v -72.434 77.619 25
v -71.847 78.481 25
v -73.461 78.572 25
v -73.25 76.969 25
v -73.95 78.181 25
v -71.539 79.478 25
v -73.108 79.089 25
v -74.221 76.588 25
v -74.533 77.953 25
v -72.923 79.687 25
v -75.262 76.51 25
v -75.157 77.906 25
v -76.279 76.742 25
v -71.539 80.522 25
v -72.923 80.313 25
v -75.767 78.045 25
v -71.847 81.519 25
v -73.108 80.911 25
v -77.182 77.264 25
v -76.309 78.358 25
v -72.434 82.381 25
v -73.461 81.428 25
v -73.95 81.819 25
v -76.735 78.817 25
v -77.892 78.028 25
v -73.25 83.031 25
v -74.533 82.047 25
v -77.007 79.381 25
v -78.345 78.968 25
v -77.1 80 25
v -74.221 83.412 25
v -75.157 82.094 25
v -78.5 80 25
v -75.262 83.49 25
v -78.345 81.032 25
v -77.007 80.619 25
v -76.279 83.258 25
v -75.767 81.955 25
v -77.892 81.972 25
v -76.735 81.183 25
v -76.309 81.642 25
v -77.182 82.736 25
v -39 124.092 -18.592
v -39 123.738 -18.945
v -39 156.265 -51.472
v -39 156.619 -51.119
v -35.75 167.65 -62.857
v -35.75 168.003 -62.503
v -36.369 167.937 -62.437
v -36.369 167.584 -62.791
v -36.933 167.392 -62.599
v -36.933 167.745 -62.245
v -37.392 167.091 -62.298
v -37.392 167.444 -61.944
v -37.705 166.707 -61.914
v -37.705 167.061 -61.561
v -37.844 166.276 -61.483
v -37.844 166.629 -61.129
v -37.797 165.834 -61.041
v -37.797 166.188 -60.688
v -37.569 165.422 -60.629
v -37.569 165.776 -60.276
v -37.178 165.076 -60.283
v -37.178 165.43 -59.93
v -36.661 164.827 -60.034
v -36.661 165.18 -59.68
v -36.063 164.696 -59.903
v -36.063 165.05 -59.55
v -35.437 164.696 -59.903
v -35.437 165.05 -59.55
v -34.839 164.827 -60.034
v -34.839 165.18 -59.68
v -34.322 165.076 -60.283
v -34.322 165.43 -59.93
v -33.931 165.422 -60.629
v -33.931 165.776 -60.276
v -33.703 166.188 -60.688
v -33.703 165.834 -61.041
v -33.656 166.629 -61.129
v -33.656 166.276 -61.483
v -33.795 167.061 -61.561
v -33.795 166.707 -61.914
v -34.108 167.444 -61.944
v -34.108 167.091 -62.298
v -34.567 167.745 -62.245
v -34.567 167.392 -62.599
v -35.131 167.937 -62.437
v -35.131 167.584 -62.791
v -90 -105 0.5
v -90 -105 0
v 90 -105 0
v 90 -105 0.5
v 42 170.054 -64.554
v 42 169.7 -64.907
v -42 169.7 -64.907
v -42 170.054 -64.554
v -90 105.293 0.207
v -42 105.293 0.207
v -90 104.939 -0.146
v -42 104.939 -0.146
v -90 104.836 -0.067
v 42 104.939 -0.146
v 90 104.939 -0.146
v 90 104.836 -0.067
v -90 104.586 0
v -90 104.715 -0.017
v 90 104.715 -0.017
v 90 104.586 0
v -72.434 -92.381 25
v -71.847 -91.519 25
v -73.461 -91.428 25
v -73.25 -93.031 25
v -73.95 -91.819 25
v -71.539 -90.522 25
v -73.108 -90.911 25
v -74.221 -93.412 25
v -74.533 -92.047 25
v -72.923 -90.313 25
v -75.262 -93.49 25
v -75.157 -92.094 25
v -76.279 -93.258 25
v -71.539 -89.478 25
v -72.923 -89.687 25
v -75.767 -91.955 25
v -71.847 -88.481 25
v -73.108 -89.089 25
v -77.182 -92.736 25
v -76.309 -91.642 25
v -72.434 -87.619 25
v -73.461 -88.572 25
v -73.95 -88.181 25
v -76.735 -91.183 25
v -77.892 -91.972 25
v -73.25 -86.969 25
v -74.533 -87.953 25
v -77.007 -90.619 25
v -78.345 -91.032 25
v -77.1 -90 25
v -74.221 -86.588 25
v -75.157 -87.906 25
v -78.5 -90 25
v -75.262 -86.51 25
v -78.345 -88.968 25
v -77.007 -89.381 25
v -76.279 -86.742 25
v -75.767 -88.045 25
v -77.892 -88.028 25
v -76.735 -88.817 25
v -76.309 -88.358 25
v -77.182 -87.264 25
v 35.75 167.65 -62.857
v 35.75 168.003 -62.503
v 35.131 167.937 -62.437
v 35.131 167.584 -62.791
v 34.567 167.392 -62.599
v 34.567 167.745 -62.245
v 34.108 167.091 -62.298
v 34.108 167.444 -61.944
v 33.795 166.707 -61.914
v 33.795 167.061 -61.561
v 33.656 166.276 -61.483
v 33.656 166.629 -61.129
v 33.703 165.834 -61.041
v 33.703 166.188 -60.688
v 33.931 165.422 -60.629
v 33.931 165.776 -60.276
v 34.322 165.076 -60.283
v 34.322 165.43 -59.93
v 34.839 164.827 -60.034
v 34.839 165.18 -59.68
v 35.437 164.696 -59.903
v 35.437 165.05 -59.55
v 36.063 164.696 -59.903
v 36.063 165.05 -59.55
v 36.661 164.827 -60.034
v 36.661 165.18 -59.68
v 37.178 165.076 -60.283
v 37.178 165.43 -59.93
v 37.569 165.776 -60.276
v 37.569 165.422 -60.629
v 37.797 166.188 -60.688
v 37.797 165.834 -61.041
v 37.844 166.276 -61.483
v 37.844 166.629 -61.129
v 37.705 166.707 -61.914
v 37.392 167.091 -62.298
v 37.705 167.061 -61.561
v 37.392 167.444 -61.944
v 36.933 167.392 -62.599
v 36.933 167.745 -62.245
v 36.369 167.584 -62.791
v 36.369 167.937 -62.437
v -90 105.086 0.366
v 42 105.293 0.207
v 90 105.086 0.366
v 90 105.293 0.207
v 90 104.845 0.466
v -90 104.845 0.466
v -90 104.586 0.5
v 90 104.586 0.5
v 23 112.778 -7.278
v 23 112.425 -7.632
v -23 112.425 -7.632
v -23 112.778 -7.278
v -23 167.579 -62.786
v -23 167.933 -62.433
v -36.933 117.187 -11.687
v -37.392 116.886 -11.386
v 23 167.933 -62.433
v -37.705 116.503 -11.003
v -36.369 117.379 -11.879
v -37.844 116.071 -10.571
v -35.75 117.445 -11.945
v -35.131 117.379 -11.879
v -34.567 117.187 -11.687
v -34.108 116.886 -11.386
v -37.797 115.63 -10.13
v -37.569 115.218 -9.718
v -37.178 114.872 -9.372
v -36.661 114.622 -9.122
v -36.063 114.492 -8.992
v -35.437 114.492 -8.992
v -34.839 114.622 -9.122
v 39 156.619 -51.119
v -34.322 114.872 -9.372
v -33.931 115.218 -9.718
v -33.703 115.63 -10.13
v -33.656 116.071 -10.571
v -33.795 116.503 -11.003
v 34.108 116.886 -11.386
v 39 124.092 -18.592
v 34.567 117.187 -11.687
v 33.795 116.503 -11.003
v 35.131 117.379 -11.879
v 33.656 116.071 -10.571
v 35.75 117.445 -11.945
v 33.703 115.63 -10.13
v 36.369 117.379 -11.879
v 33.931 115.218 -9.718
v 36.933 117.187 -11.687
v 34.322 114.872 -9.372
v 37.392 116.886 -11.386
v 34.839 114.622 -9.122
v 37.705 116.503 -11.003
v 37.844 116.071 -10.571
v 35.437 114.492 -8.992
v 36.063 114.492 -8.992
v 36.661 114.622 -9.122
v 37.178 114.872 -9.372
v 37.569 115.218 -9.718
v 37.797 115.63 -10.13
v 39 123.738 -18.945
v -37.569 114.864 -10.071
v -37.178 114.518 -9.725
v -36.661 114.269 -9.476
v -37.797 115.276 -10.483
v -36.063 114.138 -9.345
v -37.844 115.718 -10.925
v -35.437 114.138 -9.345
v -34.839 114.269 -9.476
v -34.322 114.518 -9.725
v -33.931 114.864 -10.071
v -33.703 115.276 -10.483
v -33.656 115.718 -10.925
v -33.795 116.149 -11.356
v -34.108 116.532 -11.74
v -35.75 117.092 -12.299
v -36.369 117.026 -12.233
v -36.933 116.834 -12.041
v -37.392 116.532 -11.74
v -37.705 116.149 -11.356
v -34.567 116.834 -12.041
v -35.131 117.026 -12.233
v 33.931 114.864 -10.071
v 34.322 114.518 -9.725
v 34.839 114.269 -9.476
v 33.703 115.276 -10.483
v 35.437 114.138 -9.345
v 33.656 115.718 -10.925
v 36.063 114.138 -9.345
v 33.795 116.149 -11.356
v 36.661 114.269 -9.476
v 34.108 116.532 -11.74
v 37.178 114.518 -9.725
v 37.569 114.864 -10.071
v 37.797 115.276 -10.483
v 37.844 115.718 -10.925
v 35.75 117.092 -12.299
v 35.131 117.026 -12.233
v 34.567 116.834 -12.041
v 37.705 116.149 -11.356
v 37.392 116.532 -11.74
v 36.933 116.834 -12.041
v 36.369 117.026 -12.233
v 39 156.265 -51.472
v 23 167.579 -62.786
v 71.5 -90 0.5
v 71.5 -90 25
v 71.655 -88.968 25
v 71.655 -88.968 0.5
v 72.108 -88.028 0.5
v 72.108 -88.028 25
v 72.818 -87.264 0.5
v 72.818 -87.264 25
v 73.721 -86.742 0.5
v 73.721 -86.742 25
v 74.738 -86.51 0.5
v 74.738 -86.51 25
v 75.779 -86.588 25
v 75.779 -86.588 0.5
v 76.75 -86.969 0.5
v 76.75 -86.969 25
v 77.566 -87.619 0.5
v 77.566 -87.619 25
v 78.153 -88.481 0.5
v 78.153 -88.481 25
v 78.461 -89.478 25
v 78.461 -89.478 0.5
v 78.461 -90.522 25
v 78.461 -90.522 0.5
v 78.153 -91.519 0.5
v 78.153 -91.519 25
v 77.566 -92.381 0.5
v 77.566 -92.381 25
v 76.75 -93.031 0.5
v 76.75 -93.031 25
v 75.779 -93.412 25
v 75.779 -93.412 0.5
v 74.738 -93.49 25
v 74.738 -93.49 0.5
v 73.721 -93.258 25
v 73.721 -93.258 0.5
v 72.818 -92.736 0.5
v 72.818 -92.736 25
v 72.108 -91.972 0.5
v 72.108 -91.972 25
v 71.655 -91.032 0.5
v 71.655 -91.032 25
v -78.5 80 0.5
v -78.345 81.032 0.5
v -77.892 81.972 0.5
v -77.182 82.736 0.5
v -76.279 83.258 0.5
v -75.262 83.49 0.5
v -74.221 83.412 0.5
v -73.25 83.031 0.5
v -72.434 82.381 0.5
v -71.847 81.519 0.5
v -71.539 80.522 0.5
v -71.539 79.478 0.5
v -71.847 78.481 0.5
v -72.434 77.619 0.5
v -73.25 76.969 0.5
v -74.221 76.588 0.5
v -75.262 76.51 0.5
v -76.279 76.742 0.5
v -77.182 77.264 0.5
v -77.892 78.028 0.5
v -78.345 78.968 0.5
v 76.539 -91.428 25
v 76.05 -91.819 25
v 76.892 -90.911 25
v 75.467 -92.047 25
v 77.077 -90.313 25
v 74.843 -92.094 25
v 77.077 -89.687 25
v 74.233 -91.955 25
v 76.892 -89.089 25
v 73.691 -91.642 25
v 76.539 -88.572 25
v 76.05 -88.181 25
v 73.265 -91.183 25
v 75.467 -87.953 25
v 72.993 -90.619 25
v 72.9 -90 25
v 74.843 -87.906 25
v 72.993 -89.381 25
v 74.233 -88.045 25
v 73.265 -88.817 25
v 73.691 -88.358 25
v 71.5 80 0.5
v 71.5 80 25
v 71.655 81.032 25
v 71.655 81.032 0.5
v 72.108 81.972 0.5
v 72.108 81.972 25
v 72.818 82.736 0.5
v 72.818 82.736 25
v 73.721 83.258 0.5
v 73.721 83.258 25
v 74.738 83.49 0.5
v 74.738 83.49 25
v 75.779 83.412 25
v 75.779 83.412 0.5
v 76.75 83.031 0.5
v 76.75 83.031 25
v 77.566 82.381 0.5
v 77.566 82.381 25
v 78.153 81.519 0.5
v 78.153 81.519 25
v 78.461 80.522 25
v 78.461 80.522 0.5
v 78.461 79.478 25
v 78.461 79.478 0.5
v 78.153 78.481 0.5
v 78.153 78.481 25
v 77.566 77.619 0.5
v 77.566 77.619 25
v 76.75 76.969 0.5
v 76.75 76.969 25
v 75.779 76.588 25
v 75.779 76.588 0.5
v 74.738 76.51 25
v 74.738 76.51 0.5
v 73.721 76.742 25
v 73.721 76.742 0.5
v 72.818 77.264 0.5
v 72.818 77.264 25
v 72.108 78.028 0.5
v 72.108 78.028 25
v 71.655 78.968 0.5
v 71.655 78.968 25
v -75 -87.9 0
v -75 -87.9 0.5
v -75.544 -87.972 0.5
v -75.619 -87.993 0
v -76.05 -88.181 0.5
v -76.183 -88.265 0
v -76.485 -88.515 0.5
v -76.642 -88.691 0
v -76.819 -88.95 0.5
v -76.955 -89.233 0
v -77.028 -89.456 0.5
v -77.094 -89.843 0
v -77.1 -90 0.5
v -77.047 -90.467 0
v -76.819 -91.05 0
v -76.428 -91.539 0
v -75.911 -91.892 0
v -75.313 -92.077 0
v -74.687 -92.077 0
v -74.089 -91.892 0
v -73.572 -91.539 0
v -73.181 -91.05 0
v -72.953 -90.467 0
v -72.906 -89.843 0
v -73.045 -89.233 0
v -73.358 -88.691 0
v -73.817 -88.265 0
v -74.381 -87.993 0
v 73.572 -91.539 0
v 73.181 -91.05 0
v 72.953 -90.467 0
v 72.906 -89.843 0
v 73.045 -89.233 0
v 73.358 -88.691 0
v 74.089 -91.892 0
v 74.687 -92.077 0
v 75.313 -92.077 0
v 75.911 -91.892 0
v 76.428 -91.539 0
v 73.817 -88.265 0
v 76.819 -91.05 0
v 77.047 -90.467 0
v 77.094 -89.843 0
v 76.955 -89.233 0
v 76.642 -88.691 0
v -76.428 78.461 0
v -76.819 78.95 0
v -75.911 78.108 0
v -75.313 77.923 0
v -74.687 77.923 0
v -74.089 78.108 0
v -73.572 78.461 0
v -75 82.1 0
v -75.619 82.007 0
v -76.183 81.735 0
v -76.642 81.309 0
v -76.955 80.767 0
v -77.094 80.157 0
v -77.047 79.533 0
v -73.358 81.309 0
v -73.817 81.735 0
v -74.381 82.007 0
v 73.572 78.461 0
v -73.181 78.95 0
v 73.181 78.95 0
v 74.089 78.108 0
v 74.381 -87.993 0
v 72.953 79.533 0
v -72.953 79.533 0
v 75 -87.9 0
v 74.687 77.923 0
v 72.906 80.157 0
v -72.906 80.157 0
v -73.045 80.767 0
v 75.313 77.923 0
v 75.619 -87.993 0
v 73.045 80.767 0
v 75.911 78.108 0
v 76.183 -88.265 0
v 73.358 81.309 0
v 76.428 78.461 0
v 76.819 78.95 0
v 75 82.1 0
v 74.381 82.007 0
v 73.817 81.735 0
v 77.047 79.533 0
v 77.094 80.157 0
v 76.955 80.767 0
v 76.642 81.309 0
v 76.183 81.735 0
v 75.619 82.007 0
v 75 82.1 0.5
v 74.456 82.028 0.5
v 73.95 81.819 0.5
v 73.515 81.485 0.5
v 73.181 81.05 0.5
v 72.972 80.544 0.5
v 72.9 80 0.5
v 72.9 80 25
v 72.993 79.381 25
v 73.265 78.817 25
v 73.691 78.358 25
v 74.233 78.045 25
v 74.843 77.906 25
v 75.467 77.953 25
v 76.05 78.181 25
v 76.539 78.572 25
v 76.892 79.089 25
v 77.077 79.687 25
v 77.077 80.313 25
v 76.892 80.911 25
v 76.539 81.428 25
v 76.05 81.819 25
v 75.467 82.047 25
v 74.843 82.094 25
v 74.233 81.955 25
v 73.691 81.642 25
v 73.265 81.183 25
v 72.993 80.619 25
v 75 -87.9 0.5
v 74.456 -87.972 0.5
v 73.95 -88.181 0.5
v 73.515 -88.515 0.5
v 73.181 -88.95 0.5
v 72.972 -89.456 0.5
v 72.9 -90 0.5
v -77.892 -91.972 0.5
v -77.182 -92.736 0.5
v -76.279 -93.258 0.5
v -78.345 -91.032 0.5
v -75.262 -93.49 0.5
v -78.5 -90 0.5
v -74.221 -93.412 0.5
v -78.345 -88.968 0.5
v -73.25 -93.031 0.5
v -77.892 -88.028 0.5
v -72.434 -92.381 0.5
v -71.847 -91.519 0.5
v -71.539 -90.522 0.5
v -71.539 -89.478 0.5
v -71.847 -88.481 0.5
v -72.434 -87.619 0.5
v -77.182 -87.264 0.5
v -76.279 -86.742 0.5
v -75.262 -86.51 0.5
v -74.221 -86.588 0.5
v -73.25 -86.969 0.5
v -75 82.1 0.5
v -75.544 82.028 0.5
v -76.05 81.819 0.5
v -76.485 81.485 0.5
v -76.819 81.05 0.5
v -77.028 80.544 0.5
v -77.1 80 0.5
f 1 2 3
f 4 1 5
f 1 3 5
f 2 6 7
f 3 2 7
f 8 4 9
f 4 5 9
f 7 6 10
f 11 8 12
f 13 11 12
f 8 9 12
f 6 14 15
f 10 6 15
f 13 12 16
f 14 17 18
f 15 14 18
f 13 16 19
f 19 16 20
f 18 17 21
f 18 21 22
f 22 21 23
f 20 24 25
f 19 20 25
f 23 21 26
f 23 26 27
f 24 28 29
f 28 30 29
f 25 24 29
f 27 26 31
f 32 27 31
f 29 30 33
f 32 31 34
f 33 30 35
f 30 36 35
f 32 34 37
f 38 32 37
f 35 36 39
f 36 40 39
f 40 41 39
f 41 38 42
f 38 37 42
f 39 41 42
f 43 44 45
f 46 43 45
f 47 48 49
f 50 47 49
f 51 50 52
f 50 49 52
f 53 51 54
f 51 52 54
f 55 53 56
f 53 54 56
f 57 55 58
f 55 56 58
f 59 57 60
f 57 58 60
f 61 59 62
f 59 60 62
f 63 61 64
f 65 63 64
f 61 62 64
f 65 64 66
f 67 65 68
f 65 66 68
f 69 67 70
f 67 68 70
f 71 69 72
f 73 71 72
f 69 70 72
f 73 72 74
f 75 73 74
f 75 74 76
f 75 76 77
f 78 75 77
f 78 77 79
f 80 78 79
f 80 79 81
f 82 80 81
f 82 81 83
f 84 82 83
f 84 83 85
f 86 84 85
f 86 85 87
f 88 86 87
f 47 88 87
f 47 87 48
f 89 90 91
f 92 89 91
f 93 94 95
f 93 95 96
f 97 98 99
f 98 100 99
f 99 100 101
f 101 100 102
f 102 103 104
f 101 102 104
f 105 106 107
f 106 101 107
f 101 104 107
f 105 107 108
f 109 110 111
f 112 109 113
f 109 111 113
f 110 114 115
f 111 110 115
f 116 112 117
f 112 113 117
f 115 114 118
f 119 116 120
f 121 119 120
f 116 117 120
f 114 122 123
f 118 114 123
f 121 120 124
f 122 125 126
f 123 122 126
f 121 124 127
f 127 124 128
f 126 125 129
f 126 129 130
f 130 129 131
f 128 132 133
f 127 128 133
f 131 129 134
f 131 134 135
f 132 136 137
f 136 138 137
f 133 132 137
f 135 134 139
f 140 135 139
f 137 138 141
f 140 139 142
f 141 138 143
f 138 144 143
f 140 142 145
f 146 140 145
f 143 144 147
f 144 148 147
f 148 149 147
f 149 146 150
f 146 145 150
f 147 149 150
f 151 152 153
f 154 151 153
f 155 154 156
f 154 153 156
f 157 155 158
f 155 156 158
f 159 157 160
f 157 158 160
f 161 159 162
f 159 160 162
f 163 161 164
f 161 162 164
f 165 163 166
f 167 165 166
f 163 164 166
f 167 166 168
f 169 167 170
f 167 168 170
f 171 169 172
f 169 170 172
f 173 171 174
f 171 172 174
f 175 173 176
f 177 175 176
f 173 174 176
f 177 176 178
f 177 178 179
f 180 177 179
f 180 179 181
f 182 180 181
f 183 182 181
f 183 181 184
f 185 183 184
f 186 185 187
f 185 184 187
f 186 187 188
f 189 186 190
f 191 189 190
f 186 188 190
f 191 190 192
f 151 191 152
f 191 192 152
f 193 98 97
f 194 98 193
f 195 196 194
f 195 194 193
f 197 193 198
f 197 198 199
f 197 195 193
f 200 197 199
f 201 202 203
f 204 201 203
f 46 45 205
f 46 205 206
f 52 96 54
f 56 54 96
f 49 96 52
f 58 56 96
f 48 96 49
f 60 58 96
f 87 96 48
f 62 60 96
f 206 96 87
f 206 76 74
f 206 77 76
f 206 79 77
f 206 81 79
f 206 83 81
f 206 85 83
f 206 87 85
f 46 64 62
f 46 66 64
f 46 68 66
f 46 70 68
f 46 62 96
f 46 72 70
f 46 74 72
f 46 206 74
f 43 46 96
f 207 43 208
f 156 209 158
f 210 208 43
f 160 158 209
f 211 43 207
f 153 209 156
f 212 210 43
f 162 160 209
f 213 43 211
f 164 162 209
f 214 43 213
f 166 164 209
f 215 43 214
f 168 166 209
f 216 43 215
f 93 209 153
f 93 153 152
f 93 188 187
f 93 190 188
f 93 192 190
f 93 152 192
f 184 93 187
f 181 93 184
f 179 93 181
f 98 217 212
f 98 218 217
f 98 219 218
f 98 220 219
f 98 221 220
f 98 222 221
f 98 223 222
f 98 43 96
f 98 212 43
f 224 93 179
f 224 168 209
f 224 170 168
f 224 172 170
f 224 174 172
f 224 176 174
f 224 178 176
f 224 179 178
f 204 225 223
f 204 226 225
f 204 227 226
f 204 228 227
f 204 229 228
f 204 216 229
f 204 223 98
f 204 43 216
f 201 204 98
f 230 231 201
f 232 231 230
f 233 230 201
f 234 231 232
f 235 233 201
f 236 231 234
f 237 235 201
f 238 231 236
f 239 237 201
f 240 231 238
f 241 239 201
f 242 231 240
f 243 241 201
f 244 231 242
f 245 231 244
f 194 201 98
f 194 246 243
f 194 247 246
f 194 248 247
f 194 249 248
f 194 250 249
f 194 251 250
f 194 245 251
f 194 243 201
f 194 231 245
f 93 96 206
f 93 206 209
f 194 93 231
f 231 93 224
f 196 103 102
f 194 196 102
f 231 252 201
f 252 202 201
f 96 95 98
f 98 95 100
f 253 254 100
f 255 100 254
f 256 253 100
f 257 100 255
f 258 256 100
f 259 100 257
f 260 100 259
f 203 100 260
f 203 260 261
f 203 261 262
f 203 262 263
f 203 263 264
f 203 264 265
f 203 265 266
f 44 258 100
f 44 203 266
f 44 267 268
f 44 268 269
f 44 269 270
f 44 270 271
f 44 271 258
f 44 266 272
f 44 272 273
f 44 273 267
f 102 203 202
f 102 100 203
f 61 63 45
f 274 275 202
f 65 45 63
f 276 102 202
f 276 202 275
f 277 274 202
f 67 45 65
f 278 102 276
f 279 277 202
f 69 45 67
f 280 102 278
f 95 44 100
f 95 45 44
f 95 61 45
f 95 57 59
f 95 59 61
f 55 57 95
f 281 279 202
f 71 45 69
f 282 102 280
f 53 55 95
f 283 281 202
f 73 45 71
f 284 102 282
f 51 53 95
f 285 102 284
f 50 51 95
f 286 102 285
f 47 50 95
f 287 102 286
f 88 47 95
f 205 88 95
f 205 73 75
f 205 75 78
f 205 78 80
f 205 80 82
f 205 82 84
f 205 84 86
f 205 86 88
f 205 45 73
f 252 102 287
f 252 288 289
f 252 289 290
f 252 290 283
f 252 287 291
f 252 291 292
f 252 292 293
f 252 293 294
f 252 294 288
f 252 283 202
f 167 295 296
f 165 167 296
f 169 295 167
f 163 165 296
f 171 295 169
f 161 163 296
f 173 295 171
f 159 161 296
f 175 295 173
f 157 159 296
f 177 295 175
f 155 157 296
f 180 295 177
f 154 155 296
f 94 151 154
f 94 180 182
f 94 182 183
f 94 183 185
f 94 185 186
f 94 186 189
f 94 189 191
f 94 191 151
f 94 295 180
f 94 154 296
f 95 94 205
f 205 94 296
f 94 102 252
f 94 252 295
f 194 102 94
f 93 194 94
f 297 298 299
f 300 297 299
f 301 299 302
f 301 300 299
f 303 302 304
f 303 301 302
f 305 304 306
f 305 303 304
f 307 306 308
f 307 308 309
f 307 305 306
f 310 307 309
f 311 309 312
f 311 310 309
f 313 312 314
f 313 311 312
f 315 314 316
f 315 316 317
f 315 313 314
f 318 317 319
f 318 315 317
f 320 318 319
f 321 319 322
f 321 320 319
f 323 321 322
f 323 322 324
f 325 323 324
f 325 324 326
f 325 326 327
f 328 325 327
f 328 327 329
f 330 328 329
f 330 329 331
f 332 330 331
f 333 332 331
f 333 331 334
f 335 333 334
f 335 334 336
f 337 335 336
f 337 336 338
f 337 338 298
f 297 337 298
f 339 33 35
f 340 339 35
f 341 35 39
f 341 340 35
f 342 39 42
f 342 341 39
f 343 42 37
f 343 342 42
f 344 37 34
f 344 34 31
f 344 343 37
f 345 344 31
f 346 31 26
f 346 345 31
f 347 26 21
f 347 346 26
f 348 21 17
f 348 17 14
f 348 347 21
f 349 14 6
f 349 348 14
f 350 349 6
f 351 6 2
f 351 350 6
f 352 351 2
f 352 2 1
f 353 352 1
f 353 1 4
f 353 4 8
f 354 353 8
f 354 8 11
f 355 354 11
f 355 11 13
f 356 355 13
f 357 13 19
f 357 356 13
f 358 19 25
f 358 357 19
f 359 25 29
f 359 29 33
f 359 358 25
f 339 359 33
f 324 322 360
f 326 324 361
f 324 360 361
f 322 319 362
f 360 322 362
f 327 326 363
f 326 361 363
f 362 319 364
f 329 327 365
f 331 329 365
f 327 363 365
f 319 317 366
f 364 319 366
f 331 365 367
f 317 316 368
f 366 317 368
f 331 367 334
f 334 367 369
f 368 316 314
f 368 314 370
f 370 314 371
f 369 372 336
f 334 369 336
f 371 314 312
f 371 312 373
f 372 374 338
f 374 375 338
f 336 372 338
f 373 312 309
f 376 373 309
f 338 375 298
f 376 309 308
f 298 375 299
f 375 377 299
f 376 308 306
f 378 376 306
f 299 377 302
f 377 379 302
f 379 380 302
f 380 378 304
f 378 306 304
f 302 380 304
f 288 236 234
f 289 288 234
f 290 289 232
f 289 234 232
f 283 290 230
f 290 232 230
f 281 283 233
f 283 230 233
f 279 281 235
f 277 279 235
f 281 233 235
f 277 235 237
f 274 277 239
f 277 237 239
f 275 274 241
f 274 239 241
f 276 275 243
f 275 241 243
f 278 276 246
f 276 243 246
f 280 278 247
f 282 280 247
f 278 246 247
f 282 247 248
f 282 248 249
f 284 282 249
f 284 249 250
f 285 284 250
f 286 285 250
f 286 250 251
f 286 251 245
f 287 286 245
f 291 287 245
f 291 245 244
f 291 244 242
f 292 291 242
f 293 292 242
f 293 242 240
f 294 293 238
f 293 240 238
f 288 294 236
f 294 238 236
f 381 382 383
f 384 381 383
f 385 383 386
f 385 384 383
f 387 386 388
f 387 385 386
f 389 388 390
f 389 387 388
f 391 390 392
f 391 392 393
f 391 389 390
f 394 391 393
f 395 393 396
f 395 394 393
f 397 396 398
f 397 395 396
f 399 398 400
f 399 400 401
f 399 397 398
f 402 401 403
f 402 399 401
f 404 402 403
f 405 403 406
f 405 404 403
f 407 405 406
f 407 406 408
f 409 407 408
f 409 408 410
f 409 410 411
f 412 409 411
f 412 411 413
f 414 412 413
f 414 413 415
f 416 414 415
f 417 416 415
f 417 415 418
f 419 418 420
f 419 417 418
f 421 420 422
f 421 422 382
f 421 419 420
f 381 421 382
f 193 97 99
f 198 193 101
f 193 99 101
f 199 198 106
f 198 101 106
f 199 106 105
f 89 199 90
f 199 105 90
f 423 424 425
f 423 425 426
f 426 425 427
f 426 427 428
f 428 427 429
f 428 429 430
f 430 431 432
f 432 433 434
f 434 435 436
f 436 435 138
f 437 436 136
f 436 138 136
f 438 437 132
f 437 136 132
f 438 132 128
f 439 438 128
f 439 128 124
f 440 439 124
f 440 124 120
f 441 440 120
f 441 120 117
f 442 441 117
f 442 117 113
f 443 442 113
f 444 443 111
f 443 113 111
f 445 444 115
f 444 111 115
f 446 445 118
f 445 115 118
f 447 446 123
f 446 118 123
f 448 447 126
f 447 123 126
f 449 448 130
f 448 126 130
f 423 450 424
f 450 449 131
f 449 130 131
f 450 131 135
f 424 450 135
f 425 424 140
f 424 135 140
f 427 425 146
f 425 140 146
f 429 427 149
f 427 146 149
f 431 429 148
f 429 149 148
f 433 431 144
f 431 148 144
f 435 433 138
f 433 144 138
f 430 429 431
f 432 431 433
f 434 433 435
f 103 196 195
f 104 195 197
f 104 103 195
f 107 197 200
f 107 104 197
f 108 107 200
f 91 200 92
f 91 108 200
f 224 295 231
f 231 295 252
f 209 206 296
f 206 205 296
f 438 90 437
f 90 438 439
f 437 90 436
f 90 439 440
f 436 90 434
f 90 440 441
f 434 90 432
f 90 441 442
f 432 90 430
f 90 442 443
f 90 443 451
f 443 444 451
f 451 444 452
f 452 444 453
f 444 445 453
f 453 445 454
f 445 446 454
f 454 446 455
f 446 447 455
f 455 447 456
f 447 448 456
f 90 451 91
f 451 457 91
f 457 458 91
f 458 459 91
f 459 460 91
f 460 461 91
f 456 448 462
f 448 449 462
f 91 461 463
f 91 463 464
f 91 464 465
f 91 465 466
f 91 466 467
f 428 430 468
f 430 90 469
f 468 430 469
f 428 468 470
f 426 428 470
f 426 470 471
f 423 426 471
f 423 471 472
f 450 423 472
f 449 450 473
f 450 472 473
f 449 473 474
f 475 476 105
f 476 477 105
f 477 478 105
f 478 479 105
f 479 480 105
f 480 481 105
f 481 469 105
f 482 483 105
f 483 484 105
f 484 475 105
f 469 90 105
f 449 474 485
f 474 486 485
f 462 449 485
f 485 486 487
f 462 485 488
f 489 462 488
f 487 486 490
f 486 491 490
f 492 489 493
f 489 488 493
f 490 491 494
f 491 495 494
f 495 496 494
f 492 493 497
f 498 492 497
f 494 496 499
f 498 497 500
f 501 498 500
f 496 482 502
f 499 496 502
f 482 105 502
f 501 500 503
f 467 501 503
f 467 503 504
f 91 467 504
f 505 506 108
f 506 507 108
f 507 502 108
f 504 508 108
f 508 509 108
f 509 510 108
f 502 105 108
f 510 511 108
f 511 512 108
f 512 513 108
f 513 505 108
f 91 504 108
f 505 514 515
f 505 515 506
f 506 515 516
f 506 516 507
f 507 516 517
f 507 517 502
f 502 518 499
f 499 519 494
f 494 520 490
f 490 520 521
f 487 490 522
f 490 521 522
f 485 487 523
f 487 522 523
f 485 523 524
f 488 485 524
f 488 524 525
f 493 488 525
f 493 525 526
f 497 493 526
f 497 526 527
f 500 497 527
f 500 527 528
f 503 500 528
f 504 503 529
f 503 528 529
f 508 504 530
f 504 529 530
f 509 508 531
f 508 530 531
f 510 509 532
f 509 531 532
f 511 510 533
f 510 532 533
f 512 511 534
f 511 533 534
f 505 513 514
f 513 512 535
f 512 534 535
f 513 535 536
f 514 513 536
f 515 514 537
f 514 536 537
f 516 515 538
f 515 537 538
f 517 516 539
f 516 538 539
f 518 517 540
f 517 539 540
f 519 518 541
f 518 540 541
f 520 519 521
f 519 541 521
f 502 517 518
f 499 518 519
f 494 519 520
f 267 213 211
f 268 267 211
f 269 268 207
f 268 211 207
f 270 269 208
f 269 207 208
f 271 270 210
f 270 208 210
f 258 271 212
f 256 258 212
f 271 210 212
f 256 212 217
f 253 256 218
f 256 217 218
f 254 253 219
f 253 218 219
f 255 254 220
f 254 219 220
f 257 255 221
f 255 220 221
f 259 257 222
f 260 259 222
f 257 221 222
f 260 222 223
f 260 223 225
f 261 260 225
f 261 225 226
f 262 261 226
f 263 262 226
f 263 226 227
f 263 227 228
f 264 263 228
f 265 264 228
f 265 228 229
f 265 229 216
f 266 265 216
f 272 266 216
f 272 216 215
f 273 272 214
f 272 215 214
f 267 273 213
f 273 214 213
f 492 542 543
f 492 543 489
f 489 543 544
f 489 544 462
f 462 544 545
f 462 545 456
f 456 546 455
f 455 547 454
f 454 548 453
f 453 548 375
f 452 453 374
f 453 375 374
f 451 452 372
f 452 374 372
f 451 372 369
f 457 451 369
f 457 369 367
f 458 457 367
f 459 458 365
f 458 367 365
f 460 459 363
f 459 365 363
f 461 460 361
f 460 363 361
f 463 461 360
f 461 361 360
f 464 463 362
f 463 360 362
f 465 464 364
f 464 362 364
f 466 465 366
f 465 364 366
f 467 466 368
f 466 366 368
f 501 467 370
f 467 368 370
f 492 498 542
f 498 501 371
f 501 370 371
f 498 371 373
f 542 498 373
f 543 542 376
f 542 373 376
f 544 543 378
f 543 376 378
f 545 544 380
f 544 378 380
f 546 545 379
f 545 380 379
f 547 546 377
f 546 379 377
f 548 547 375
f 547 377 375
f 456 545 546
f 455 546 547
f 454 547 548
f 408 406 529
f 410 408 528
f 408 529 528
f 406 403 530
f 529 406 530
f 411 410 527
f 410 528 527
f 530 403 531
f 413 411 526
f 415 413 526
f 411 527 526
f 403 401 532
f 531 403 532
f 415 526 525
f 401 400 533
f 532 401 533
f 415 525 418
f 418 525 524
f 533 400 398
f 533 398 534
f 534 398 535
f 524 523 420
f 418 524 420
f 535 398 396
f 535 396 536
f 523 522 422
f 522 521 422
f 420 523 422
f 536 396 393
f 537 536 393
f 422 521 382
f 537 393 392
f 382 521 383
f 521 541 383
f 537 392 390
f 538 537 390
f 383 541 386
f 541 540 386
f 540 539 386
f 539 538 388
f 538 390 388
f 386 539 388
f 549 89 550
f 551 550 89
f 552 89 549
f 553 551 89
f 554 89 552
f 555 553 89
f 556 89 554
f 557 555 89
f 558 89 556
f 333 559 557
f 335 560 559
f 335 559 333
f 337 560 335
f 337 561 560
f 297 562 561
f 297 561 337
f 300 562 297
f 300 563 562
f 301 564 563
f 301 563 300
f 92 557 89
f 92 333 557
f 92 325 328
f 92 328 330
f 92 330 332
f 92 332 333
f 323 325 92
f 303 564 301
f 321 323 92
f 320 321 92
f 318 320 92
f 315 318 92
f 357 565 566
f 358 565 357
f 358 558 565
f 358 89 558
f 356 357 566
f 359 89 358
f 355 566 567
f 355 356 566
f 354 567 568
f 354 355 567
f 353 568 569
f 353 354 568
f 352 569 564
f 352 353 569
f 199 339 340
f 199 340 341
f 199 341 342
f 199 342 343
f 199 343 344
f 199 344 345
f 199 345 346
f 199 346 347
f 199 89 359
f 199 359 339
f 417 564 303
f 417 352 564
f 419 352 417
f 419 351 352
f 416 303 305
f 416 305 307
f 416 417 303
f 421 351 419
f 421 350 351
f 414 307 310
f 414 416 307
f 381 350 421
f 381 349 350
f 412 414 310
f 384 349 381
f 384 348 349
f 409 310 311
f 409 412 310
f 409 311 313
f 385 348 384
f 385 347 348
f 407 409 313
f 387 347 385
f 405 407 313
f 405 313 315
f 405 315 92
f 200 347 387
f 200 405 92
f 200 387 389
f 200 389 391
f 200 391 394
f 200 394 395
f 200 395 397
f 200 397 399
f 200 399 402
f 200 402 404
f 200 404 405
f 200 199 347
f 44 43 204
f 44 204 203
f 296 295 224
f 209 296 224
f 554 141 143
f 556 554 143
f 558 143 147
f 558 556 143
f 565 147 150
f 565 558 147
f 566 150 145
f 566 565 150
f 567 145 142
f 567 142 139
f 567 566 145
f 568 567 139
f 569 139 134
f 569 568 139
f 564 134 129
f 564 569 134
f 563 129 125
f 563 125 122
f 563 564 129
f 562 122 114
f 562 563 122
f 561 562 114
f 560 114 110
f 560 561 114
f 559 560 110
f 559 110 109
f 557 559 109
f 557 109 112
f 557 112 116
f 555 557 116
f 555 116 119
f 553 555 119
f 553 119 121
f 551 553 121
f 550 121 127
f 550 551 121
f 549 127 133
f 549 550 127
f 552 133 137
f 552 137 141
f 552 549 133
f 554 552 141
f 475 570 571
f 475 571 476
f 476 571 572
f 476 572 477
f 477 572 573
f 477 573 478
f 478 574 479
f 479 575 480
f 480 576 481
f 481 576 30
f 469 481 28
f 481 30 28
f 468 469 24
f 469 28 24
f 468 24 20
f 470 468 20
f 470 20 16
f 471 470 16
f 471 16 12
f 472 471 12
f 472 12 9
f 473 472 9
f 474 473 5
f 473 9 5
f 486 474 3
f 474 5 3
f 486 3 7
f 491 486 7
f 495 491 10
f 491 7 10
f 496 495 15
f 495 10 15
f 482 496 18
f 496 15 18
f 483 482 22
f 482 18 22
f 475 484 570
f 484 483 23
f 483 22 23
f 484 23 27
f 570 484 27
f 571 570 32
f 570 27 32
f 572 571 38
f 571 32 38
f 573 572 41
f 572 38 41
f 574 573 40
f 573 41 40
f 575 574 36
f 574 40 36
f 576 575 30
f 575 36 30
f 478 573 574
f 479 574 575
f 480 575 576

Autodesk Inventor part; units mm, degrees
ref_plane "YZ Plane" through (0, 0, 0) normal (1, 0, 0) x (0, 1, 0)
ref_plane "XZ Plane" through (0, 0, 0) normal (0, 1, 0) x (-1, 0, 0)
ref_plane "XY Plane" through (0, 0, 0) normal (0, 0, 1) x (1, 0, 0)
sketch "Sketch1" plane through (0, 0, 0) normal (0, 0, 1) x (1, 0, 0)
  line L0 (-90, -105) -> (90, -105)
  line L1 (90, -105) -> (90, 105)
  line L2 (-90, 105) -> (-90, -105)
  line L3 (42, 105) -> (42, 105)
  line L4 (42, 105) -> (-42, 105)
  line L5 (-42, 105) -> (-42, 105)
  line L6 (90, 105) -> (42, 105)
  line L7 (-42, 105) -> (-90, 105)
  point P0 (0, 0)
  dimension "d0" = 180
  dimension "d1" = 210
  dimension "d2" = 105
  dimension "d3" = 90
  dimension "d22" = 0
  dimension "d24" = 42
  dimension "d26" = 84
  dimension "d28" = 0
  dimension "d29" = 210
  dimension "d30" = 48
  dimension "d31" = 48
extrude "Plate1" add sketch "Sketch1" along normal blind 0.5
sketch "Sketch6" plane through (90, 104.6464, 0.1464) normal (0, 0.7071068, 0.7071068) x (-1, 0, 0)
  line L0 (180, 0) -> (0, 0)
  line L1 (0, 0) -> (0, -92)
  line L2 (0, -92) -> (180, -92)
  line L3 (180, -92) -> (180, 0)
edge flange "Flange1" height 92 angle 45 thickness 0.5 bend radius 0.5 thickness toward (0, 0.7071068, 0.7071068) relief tear relief width 0.5 relief depth 0.25 edges at (66, 105, 0) wall of the first edge with corners at (-90, 104.6464, 0.1464) (90, 104.6464, 0.1464) (90, 169.7003, -64.9074) (-90, 169.7003, -64.9074)
bend "Bend1"
corner "Corner1"
sketch "Sketch7" plane through (90, 169.7003, -64.9074) normal (0, -0.7071068, -0.7071068) x (-1, 0, 0)
  line L0 (180, 0) -> (0, 0) projected
  line L1 (180, -91.9393) -> (0, -91.9393) projected
  line L2 (180, -91.5858) -> (180, 0) projected
  line L3 (0, -91.5858) -> (0, 0) projected
  line L4 (0, -91.5858) -> (180, -91.5858) projected
  line L5 (0, -91.5858) -> (180, -91.5858) projected
  line L6 (180, -91.5858) -> (180, 0) projected
  line L7 (180, 0) -> (0, 0) projected
  line L8 (0, -91.5858) -> (0, 0) projected
  line L9 (0, -91.5858) -> (48, -91.5858)
  line L10 (48, -91.5858) -> (48, 0)
  line L11 (48, 0) -> (0, 0)
  line L12 (0, 0) -> (0, -91.5858)
  point P0 (90, -165.8927)
  dimension "d88" = 180
  dimension "d89" = 48
extrude "Extrusion4" cut sketch "Sketch7" against normal blind 10 contours L10 L4 L3 L0
mirror "Mirror1" about plane through (0, 0, 0) normal (1, 0, 0) of "Extrusion4"
sketch "Sketch8" plane through (42, 169.7003, -64.9074) normal (0, -0.7071068, -0.7071068) x (-1, 0, 0)
  line L0 (81, -3) -> (3, -3)
  line L1 (3, -3) -> (3, -81)
  line L2 (3, -81) -> (81, -81)
  line L3 (81, -81) -> (81, -3)
  line L4 (81, -3) -> (3, -81) construction
  line L5 (3, -3) -> (81, -81) construction
  line L6 (84, 0) -> (0, 0) projected
  point P0 (42, -165.8927)
  point P1 (42, -42)
  dimension "d92" = 78
  dimension "d93" = 0
  dimension "d94" = 3
  dimension "d111" = 78
extrude "Extrusion5" cut sketch "Sketch8" against normal blind 10
chamfer "Chamfer2" distance 16 angle 45 4 edges at (39, 112.6014, -7.455) (39, 167.7557, -62.6093) (-39, 167.7557, -62.6093) (-39, 112.6014, -7.455)
sketch "Sketch9" plane through (42, 169.7003, -64.9074) normal (0, -0.7071068, -0.7071068) x (-1, 0, 0)
  line L0 (77.75, -5) -> (6.25, -5) construction
  line L1 (6.25, -5) -> (6.25, -76.5) construction
  line L2 (6.25, -76.5) -> (77.75, -76.5) construction
  line L3 (77.75, -76.5) -> (77.75, -5) construction
  line L4 (77.75, -5) -> (6.25, -76.5) construction
  line L5 (6.25, -5) -> (77.75, -76.5) construction
  line L6 (84, 0) -> (0, 0) construction
  point P0 (42, -165.8927)
  point P1 (42, -40.75)
  dimension "d100" = 71.5
  dimension "d101" = 71.5
  dimension "d102" = 35.75
  dimension "d103" = 5
hole "Hole3" at (35.75, 166.1647, -61.3718) at (-35.75, 166.1647, -61.3718) at (-35.75, 115.6066, -10.8137) at (35.75, 115.6066, -10.8137) direction (0, 0.7071068, 0.7071068) diameter 4.2 end through all
sketch "Sketch10" plane through (0, 0, 0) normal (0, 0, -1) x (-1, 0, 0)
  line L0 (-75, -90) -> (75, -90) construction
  line L1 (75, -90) -> (75, 80) construction
  line L2 (75, 80) -> (-75, 80) construction
  line L3 (-75, 80) -> (-75, -90) construction
  line L4 (-75, -90) -> (75, 80) construction
  line L5 (75, -90) -> (-75, 80) construction
  line L6 (90, -105) -> (-90, -105) projected
  point P0 (0, -5)
  point P1 (0, 0)
  dimension "d112" = 170
  dimension "d113" = 150
  dimension "d114" = 75
  dimension "d115" = 15
hole "Hole4" at (75, 80, 0) at (75, -90, 0) at (-75, -90, 0) at (-75, 80, 0) direction (0, 0, 1) diameter 4.2 end through all
sketch "Sketch11" plane through (0, 0, 0) normal (0, 0, -1) x (-1, 0, 0)
  circle A0 centre (-75, 80) radius 2.1 projected
  circle A1 centre (-75, 80) radius 3.5
  circle A2 centre (-75, -90) radius 2.1 projected
  circle A3 centre (75, -90) radius 2.1 projected
  circle A4 centre (75, 80) radius 2.1 projected
  circle A5 centre (-75, -90) radius 3.5
  circle A6 centre (75, -90) radius 3.5
  circle A7 centre (75, 80) radius 3.5
  point P0 (0, 0)
  dimension "d123" = 7
  dimension "d124" = 7
  dimension "d125" = 7
  dimension "d126" = 7
extrude "Extrusion7" add sketch "Sketch11" against normal blind 25
equation "\"d111\" = d92"
equation "\"d101\" = d100"
equation "\"d102\" = 0.5 * d101"
equation "\"d109\" = Thickness"
equation "\"d114\" = 0.5 * d113"
equation "\"d121\" = Thickness"
equation "\"d74\" = Thickness"
equation "\"d75\" = BendReliefWidth"
equation "\"d76\" = BendReliefDepth"
equation "\"d77\" = MinimumRemnant"
equation "\"d78\" = TransitionRadius"
equation "\"d81\" = BendRadius"
equation "\"d82\" = CornerReliefSize"
equation "\"d83\" = GapSize"
equation "\"d84\" = JacobiRadiusSize"
equation "\"d2\" = 0.5 * d1"
equation "\"d3\" = 0.5 * d0"
equation "\"d24\" = 0.5 * d26"
equation "\"BendRadius\" = Thickness"
equation "\"BendReliefWidth\" = Thickness"
equation "\"BendReliefDepth\" = 0.5 * Thickness"
equation "\"CornerReliefSize\" = 4 * Thickness"
equation "\"MinimumRemnant\" = 2 * Thickness"
equation "\"TransitionRadius\" = BendRadius"
equation "\"JacobiRadiusSize\" = BendRadius"
equation "\"GapSize\" = Thickness"
equation "\"Thickness\" = 0.5"
properties part number "XGEN_hotbed-pcb"
